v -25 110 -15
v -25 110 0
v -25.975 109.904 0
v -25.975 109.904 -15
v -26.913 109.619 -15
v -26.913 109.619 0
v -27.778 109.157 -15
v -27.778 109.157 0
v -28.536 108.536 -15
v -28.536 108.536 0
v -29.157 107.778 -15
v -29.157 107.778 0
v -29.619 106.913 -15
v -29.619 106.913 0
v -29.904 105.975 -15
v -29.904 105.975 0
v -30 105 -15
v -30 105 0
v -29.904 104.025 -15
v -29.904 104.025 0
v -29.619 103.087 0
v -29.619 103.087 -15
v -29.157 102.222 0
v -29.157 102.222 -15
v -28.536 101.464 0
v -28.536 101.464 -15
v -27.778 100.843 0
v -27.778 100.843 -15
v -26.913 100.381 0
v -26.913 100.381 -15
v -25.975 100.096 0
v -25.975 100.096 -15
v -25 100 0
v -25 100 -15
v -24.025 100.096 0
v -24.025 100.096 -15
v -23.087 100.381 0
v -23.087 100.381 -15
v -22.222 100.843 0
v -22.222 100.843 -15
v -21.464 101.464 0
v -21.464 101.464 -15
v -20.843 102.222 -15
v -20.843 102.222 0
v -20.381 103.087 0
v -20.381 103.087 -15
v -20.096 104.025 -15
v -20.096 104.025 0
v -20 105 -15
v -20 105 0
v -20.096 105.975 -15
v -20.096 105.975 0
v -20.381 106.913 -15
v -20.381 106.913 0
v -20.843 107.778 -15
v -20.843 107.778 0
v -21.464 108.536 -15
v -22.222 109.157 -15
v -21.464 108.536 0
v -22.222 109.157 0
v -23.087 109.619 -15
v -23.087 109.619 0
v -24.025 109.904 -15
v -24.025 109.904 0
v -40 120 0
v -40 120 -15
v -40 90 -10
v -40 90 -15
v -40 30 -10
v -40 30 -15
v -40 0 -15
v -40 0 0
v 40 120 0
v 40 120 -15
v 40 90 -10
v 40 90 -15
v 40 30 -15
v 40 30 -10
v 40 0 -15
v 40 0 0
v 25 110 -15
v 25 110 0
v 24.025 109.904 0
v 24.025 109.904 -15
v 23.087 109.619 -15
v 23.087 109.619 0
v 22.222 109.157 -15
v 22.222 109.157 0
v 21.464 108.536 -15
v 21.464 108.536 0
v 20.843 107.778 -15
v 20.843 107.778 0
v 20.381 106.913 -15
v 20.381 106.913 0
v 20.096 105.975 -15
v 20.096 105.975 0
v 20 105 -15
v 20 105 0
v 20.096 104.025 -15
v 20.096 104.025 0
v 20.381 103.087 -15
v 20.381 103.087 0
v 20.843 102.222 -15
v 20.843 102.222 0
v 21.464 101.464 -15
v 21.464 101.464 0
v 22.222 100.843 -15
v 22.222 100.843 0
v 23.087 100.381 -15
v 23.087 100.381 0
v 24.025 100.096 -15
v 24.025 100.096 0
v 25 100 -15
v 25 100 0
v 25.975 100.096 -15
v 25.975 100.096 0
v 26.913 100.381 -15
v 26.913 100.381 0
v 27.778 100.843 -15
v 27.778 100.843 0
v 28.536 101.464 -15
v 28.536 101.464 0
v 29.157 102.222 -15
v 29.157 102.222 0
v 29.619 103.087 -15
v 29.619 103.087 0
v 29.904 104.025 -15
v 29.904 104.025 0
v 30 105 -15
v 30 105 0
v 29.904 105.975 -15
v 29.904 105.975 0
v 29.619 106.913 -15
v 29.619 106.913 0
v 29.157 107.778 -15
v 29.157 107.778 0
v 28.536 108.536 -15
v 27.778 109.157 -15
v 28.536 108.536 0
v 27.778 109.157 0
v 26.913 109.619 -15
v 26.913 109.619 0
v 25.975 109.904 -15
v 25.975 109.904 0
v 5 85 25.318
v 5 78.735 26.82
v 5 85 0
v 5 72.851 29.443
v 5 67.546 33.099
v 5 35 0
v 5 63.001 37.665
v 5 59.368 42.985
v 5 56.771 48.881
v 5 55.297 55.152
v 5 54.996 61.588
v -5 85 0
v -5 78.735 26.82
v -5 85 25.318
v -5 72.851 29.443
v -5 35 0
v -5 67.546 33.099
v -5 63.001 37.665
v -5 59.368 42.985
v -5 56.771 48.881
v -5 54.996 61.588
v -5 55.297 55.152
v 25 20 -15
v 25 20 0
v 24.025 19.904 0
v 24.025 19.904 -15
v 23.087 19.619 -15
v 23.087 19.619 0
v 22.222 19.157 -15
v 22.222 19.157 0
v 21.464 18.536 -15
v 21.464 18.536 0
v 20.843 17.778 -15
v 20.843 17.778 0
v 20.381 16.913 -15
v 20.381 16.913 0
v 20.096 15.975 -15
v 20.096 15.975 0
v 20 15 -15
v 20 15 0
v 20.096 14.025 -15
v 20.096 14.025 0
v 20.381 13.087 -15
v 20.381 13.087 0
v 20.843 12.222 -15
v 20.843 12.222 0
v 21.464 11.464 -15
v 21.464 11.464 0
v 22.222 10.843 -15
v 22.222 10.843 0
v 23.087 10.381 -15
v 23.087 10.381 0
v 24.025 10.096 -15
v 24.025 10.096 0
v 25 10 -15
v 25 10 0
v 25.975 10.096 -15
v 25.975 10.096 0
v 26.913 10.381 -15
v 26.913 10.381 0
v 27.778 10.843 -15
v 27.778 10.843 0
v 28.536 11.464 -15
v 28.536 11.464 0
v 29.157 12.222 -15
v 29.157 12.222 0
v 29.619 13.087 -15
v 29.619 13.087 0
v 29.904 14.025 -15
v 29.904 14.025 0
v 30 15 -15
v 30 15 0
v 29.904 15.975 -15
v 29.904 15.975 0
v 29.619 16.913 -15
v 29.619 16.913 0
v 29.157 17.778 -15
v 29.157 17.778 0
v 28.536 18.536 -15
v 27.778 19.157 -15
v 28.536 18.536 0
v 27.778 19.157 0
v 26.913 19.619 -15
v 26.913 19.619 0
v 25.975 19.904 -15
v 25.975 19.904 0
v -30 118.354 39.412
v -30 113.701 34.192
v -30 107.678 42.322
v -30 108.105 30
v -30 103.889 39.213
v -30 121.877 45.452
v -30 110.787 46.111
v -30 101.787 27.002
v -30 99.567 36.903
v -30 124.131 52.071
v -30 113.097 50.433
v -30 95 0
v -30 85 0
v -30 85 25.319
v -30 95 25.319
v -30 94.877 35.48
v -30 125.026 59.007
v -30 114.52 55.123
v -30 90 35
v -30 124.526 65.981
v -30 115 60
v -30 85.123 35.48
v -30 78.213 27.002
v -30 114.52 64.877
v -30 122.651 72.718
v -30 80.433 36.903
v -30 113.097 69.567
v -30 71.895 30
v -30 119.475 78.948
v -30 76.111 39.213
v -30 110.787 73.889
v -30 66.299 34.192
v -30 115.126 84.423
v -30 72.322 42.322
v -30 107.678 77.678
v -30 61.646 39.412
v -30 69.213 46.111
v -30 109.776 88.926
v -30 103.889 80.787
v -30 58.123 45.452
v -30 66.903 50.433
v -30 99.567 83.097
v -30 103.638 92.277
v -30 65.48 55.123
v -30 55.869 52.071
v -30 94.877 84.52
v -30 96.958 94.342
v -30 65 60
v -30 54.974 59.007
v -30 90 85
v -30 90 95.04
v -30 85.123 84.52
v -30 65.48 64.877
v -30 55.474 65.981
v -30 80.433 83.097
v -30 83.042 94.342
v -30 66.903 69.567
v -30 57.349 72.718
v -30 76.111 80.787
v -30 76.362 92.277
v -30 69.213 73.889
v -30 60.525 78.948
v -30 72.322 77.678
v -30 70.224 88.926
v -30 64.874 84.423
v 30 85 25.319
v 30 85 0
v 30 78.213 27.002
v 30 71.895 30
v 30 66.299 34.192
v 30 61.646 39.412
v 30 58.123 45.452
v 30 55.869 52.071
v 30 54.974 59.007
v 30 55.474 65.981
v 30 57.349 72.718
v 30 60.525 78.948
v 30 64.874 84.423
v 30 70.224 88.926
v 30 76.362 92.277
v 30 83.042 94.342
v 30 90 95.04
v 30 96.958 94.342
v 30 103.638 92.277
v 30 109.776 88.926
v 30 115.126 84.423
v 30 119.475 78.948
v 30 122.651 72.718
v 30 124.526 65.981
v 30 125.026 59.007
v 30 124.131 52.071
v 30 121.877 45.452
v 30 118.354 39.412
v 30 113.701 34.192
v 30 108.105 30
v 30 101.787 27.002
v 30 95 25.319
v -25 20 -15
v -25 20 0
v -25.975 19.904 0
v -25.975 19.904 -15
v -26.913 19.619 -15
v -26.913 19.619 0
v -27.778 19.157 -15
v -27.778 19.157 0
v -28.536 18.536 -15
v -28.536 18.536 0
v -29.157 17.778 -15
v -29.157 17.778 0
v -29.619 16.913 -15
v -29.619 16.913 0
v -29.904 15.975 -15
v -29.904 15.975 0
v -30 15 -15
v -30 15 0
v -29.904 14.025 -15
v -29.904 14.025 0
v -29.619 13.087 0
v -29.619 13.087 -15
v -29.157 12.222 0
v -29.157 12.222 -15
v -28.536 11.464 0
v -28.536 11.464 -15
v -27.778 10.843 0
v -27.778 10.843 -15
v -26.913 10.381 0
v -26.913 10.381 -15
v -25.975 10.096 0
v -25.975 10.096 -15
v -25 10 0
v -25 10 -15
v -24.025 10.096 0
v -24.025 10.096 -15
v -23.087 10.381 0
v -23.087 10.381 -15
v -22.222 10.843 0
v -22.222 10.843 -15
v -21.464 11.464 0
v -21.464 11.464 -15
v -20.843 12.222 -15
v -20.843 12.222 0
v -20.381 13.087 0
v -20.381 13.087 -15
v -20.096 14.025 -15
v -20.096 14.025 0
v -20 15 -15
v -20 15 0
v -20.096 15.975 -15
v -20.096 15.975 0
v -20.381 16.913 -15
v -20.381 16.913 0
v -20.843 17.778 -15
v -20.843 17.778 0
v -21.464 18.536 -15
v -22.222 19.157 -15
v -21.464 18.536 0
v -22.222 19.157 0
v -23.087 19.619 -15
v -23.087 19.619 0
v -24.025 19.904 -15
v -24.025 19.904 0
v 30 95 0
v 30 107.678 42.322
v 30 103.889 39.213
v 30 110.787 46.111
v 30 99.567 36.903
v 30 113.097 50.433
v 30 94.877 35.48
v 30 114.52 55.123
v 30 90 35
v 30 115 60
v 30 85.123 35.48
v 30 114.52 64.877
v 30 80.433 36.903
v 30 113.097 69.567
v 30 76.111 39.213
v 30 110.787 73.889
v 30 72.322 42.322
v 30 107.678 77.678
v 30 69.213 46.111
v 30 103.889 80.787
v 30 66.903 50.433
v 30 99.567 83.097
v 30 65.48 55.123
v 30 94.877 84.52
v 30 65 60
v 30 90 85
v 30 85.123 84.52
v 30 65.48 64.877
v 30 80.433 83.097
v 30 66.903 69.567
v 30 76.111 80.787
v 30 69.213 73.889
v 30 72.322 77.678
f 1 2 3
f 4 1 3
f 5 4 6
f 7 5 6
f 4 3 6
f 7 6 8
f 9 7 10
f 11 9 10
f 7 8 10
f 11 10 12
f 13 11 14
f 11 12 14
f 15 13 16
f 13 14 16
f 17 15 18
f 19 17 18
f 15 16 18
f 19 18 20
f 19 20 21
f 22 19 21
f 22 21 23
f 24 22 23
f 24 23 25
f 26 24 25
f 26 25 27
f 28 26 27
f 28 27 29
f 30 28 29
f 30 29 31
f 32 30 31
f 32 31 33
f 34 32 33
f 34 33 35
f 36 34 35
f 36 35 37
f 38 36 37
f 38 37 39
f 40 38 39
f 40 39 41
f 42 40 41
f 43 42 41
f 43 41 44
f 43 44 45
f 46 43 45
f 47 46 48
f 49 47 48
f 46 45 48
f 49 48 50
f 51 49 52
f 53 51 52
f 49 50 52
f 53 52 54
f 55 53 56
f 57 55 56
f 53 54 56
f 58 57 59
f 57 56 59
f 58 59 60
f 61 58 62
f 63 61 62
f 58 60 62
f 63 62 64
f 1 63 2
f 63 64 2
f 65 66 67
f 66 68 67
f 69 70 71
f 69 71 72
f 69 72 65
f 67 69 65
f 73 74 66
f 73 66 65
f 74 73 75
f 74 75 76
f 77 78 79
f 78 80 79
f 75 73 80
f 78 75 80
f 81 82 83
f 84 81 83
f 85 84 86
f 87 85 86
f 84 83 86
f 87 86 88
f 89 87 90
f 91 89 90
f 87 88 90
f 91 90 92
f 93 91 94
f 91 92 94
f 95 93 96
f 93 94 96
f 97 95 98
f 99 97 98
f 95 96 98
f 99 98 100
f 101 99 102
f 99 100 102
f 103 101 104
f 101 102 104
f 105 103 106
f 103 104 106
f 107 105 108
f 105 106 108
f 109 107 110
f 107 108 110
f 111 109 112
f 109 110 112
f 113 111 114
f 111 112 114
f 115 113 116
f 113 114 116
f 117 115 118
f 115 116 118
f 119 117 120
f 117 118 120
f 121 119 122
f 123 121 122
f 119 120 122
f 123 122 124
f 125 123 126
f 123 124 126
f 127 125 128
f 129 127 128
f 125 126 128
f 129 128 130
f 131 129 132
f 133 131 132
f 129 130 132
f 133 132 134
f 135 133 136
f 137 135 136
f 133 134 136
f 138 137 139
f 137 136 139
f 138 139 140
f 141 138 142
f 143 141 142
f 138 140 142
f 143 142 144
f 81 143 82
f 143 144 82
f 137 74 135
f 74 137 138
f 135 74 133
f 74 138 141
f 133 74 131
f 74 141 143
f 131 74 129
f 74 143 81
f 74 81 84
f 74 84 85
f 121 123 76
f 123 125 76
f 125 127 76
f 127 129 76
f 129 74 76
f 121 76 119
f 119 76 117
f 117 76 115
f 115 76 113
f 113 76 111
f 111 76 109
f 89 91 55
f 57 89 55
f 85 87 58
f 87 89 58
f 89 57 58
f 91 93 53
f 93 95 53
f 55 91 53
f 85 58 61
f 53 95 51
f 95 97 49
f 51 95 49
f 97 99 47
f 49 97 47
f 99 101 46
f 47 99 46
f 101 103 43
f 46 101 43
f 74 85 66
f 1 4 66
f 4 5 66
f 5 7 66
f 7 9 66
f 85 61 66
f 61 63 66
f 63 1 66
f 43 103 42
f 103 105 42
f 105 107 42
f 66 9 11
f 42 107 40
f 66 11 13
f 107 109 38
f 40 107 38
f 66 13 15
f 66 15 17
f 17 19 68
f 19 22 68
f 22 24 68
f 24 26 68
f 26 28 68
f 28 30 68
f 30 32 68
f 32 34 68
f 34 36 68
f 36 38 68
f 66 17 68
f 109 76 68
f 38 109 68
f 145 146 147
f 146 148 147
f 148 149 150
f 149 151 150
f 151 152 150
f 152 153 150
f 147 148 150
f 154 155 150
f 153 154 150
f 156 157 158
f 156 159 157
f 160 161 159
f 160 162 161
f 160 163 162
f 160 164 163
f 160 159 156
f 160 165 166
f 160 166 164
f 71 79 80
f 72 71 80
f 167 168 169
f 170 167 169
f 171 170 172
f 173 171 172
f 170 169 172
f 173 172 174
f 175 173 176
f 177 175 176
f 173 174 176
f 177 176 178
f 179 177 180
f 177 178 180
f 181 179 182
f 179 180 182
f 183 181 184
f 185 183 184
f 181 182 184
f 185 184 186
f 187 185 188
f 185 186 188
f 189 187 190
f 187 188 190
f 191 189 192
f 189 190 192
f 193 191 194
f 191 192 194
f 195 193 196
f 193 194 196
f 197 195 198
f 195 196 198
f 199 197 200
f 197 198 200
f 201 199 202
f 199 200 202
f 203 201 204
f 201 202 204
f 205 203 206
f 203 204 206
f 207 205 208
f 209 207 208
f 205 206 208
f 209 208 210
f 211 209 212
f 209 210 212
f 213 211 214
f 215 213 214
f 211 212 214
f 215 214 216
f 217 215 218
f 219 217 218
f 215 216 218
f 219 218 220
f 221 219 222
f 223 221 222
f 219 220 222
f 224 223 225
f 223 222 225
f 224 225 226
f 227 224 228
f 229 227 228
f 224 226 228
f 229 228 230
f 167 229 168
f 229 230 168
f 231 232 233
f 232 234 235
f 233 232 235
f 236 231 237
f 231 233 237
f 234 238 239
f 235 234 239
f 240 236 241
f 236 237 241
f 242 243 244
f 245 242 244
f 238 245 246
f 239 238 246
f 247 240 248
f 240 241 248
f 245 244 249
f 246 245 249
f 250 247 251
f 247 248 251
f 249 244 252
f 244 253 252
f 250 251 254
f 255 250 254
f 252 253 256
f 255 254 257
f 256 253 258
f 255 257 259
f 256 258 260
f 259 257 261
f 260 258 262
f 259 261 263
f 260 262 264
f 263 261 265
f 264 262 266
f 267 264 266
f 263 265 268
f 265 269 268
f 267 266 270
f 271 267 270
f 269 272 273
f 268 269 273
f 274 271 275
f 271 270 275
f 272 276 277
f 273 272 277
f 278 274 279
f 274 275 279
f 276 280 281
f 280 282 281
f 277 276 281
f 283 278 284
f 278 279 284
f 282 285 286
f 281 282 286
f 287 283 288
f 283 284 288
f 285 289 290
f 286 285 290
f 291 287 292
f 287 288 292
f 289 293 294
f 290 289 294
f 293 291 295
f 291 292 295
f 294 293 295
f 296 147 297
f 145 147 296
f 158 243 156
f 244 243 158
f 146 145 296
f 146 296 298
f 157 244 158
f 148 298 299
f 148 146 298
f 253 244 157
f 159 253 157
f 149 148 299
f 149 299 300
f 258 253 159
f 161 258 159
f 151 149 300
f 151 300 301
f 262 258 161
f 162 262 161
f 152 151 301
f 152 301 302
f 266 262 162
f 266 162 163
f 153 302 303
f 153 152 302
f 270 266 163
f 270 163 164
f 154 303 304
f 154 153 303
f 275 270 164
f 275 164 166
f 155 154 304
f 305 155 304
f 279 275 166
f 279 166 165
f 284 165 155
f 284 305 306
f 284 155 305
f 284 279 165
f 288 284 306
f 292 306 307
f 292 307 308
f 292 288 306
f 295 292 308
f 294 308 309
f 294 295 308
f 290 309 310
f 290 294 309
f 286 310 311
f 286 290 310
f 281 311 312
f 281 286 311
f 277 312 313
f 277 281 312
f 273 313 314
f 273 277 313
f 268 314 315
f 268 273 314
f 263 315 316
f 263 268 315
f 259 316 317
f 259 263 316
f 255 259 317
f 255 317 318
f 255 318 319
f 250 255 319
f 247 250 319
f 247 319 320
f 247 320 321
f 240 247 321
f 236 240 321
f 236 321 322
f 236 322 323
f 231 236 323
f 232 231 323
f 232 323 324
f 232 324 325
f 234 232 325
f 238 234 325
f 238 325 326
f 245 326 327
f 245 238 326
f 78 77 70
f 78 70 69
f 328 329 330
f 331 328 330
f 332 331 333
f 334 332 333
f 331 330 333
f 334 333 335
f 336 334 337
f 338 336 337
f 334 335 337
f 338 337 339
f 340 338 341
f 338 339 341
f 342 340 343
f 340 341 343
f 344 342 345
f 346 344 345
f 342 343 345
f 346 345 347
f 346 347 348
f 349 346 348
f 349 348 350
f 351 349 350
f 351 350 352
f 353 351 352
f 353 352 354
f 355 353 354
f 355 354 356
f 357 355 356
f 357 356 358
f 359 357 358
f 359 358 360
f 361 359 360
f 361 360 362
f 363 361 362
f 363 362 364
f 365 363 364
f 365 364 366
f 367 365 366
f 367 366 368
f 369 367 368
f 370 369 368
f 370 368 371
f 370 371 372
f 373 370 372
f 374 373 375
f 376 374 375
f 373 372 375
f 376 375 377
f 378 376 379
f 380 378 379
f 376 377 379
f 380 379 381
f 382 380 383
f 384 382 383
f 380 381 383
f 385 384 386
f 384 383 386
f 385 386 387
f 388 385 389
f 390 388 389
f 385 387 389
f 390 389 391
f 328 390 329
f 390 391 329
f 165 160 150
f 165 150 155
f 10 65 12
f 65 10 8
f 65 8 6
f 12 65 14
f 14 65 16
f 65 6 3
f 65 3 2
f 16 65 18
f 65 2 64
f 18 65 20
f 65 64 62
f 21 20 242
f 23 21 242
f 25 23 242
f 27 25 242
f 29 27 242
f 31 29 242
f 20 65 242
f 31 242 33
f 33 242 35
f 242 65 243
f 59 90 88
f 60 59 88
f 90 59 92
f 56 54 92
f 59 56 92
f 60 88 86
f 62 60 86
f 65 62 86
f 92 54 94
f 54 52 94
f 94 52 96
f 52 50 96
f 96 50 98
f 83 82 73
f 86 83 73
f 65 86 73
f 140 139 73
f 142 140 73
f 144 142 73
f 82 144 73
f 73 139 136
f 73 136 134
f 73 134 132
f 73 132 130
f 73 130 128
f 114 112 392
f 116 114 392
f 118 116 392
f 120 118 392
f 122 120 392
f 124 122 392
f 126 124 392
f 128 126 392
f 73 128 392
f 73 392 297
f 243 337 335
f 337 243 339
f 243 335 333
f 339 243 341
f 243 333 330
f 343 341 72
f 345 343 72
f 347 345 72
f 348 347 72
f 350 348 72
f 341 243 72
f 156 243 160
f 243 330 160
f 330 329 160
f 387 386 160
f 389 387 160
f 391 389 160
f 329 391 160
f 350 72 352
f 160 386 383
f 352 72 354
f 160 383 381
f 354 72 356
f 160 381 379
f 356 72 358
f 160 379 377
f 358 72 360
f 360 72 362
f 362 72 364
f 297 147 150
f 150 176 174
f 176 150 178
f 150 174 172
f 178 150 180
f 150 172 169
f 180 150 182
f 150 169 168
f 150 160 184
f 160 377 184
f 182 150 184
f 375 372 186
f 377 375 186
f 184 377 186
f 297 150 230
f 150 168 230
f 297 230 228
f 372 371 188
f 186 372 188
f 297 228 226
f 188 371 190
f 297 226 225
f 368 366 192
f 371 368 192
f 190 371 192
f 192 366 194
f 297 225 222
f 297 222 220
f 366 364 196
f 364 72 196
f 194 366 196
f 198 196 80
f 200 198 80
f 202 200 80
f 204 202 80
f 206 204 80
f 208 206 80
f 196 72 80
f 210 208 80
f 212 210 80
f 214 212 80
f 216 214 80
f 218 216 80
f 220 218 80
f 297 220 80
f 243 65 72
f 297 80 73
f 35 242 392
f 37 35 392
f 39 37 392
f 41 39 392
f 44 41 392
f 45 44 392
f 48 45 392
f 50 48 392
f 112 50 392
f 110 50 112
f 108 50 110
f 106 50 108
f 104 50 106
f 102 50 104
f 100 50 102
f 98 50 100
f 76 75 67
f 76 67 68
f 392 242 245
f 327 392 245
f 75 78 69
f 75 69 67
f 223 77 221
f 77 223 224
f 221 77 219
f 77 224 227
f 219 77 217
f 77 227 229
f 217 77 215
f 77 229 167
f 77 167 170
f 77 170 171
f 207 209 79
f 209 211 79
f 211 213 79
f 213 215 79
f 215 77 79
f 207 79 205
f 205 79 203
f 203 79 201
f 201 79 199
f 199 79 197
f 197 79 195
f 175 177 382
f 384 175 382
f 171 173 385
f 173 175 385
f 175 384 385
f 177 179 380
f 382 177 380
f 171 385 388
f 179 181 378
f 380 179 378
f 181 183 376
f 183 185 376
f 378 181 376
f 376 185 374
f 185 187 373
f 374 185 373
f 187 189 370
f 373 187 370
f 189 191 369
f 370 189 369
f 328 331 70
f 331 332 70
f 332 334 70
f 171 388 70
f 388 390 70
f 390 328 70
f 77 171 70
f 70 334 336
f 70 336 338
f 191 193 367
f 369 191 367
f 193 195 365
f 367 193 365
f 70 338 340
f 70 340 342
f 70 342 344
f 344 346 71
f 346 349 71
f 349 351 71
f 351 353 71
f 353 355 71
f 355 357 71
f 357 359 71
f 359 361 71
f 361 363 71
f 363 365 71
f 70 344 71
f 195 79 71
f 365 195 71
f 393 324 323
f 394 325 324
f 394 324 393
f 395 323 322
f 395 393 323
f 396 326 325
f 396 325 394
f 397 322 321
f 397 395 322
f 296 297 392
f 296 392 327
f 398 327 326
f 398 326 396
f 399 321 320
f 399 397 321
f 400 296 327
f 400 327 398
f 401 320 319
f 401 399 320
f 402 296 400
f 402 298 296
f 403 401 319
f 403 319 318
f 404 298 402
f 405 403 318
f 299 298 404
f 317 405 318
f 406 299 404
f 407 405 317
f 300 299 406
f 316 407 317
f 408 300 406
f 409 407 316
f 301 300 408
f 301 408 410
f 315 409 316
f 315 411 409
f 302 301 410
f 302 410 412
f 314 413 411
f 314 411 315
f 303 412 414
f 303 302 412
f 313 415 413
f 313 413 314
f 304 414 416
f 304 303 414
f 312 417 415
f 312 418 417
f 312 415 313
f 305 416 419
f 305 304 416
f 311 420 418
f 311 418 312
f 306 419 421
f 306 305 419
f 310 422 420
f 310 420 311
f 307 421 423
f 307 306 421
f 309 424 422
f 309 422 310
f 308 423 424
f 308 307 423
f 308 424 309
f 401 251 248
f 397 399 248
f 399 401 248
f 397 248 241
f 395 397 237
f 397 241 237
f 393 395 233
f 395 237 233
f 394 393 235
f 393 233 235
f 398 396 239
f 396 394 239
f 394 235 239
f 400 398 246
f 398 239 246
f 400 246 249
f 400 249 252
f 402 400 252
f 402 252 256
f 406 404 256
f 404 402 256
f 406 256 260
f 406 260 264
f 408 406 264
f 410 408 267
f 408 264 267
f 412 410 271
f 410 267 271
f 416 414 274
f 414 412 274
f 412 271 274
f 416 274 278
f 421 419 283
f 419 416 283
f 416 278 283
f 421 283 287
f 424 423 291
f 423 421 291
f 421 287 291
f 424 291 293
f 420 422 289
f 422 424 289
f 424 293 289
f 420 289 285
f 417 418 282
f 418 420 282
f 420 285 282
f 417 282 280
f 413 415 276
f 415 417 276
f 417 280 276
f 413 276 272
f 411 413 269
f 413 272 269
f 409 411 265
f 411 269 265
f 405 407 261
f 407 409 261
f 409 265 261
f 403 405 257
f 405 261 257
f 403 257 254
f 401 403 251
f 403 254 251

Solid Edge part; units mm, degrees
sketch "Sketch1" plane through (0, 0, 0) normal (0, -1, 0) x (1, 0, 0)
  line L0 (40, 0) -> (40, -15)
  line L1 (40, -15) -> (0, -15)
  line L2 (0, -15) -> (-40, -15)
  line L3 (-40, -15) -> (-40, 0)
  line L4 (-40, 0) -> (0, 0)
  line L5 (0, 0) -> (40, 0)
extrude "Protrusion1" add sketch "Sketch1" against normal blind 120
sketch "Sketch2" plane through (40, 60, -7.5) normal (1, 0, 0) x (0, 1, 0)
  line L0 (-30, -2.5) -> (30, -2.5)
  line L1 (30, -2.5) -> (30, -7.5)
  line L2 (30, -7.5) -> (-30, -7.5)
  line L3 (-30, -7.5) -> (-30, -2.5)
extrude "ExtrudedCutout_1" cut sketch "Sketch2" against normal blind 80
sketch "Sketch3" plane through (0, 0, 0) normal (1, 0, 0) x (0, 1, 0)
  line L0 (95, 0) -> (95, 25.3185)
  line L1 (90, 0) -> (95, 0)
  line L2 (85, 0) -> (90, 0)
  line L3 (85, 0) -> (85, 25.3185)
  arc A0 (85, 25.3185) -> (95, 25.3185) centre (90, 60) cw
extrude "ExtrudedProtrusion_2" add sketch "Sketch3" along normal mid plane 60
sketch "Sketch4" plane through (0, 0, 0) normal (1, 0, 0) x (0, 1, 0)
  circle A0 centre (90, 60) radius 25
extrude "ExtrudedCutout_2" cut sketch "Sketch4" along normal mid plane 60
sketch "Sketch5" plane through (0, 0, 0) normal (1, 0, 0) x (0, 1, 0)
  line L0 (35, 0) -> (54.9959, 61.5877)
  line L1 (55.034, 61.5417) -> (54.9959, 61.5877)
  line L2 (85, 25.3185) -> (84.962, 25.3645)
  line L3 (85, 0) -> (85, 25.3185)
  line L4 (35, 0) -> (85, 0)
  arc A0 (84.962, 25.3645) -> (55.034, 61.5417) centre (90, 60) cw
extrude "ExtrudedProtrusion_3" add sketch "Sketch5" along normal mid plane 10
sketch "Sketch6" plane through (0, 60, 0) normal (0, 0, 1) x (0, 1, 0)
  circle A0 centre (-45, -25) radius 5
extrude "ExtrudedCutout_3" cut sketch "Sketch6" against normal blind 15
sketch "Sketch7" plane through (0, 60, 0) normal (0, 0, 1) x (0, 1, 0)
  circle A0 centre (-45, 25) radius 5
extrude "ExtrudedCutout_4" cut sketch "Sketch7" against normal blind 15
sketch "Sketch8" plane through (0, 60, 0) normal (0, 0, 1) x (0, 1, 0)
  circle A0 centre (45, -25) radius 5
extrude "ExtrudedCutout_5" cut sketch "Sketch8" against normal blind 15
sketch "Sketch9" plane through (0, 60, 0) normal (0, 0, 1) x (0, 1, 0)
  circle A0 centre (45, 25) radius 5
extrude "ExtrudedCutout_6" cut sketch "Sketch9" against normal blind 15
